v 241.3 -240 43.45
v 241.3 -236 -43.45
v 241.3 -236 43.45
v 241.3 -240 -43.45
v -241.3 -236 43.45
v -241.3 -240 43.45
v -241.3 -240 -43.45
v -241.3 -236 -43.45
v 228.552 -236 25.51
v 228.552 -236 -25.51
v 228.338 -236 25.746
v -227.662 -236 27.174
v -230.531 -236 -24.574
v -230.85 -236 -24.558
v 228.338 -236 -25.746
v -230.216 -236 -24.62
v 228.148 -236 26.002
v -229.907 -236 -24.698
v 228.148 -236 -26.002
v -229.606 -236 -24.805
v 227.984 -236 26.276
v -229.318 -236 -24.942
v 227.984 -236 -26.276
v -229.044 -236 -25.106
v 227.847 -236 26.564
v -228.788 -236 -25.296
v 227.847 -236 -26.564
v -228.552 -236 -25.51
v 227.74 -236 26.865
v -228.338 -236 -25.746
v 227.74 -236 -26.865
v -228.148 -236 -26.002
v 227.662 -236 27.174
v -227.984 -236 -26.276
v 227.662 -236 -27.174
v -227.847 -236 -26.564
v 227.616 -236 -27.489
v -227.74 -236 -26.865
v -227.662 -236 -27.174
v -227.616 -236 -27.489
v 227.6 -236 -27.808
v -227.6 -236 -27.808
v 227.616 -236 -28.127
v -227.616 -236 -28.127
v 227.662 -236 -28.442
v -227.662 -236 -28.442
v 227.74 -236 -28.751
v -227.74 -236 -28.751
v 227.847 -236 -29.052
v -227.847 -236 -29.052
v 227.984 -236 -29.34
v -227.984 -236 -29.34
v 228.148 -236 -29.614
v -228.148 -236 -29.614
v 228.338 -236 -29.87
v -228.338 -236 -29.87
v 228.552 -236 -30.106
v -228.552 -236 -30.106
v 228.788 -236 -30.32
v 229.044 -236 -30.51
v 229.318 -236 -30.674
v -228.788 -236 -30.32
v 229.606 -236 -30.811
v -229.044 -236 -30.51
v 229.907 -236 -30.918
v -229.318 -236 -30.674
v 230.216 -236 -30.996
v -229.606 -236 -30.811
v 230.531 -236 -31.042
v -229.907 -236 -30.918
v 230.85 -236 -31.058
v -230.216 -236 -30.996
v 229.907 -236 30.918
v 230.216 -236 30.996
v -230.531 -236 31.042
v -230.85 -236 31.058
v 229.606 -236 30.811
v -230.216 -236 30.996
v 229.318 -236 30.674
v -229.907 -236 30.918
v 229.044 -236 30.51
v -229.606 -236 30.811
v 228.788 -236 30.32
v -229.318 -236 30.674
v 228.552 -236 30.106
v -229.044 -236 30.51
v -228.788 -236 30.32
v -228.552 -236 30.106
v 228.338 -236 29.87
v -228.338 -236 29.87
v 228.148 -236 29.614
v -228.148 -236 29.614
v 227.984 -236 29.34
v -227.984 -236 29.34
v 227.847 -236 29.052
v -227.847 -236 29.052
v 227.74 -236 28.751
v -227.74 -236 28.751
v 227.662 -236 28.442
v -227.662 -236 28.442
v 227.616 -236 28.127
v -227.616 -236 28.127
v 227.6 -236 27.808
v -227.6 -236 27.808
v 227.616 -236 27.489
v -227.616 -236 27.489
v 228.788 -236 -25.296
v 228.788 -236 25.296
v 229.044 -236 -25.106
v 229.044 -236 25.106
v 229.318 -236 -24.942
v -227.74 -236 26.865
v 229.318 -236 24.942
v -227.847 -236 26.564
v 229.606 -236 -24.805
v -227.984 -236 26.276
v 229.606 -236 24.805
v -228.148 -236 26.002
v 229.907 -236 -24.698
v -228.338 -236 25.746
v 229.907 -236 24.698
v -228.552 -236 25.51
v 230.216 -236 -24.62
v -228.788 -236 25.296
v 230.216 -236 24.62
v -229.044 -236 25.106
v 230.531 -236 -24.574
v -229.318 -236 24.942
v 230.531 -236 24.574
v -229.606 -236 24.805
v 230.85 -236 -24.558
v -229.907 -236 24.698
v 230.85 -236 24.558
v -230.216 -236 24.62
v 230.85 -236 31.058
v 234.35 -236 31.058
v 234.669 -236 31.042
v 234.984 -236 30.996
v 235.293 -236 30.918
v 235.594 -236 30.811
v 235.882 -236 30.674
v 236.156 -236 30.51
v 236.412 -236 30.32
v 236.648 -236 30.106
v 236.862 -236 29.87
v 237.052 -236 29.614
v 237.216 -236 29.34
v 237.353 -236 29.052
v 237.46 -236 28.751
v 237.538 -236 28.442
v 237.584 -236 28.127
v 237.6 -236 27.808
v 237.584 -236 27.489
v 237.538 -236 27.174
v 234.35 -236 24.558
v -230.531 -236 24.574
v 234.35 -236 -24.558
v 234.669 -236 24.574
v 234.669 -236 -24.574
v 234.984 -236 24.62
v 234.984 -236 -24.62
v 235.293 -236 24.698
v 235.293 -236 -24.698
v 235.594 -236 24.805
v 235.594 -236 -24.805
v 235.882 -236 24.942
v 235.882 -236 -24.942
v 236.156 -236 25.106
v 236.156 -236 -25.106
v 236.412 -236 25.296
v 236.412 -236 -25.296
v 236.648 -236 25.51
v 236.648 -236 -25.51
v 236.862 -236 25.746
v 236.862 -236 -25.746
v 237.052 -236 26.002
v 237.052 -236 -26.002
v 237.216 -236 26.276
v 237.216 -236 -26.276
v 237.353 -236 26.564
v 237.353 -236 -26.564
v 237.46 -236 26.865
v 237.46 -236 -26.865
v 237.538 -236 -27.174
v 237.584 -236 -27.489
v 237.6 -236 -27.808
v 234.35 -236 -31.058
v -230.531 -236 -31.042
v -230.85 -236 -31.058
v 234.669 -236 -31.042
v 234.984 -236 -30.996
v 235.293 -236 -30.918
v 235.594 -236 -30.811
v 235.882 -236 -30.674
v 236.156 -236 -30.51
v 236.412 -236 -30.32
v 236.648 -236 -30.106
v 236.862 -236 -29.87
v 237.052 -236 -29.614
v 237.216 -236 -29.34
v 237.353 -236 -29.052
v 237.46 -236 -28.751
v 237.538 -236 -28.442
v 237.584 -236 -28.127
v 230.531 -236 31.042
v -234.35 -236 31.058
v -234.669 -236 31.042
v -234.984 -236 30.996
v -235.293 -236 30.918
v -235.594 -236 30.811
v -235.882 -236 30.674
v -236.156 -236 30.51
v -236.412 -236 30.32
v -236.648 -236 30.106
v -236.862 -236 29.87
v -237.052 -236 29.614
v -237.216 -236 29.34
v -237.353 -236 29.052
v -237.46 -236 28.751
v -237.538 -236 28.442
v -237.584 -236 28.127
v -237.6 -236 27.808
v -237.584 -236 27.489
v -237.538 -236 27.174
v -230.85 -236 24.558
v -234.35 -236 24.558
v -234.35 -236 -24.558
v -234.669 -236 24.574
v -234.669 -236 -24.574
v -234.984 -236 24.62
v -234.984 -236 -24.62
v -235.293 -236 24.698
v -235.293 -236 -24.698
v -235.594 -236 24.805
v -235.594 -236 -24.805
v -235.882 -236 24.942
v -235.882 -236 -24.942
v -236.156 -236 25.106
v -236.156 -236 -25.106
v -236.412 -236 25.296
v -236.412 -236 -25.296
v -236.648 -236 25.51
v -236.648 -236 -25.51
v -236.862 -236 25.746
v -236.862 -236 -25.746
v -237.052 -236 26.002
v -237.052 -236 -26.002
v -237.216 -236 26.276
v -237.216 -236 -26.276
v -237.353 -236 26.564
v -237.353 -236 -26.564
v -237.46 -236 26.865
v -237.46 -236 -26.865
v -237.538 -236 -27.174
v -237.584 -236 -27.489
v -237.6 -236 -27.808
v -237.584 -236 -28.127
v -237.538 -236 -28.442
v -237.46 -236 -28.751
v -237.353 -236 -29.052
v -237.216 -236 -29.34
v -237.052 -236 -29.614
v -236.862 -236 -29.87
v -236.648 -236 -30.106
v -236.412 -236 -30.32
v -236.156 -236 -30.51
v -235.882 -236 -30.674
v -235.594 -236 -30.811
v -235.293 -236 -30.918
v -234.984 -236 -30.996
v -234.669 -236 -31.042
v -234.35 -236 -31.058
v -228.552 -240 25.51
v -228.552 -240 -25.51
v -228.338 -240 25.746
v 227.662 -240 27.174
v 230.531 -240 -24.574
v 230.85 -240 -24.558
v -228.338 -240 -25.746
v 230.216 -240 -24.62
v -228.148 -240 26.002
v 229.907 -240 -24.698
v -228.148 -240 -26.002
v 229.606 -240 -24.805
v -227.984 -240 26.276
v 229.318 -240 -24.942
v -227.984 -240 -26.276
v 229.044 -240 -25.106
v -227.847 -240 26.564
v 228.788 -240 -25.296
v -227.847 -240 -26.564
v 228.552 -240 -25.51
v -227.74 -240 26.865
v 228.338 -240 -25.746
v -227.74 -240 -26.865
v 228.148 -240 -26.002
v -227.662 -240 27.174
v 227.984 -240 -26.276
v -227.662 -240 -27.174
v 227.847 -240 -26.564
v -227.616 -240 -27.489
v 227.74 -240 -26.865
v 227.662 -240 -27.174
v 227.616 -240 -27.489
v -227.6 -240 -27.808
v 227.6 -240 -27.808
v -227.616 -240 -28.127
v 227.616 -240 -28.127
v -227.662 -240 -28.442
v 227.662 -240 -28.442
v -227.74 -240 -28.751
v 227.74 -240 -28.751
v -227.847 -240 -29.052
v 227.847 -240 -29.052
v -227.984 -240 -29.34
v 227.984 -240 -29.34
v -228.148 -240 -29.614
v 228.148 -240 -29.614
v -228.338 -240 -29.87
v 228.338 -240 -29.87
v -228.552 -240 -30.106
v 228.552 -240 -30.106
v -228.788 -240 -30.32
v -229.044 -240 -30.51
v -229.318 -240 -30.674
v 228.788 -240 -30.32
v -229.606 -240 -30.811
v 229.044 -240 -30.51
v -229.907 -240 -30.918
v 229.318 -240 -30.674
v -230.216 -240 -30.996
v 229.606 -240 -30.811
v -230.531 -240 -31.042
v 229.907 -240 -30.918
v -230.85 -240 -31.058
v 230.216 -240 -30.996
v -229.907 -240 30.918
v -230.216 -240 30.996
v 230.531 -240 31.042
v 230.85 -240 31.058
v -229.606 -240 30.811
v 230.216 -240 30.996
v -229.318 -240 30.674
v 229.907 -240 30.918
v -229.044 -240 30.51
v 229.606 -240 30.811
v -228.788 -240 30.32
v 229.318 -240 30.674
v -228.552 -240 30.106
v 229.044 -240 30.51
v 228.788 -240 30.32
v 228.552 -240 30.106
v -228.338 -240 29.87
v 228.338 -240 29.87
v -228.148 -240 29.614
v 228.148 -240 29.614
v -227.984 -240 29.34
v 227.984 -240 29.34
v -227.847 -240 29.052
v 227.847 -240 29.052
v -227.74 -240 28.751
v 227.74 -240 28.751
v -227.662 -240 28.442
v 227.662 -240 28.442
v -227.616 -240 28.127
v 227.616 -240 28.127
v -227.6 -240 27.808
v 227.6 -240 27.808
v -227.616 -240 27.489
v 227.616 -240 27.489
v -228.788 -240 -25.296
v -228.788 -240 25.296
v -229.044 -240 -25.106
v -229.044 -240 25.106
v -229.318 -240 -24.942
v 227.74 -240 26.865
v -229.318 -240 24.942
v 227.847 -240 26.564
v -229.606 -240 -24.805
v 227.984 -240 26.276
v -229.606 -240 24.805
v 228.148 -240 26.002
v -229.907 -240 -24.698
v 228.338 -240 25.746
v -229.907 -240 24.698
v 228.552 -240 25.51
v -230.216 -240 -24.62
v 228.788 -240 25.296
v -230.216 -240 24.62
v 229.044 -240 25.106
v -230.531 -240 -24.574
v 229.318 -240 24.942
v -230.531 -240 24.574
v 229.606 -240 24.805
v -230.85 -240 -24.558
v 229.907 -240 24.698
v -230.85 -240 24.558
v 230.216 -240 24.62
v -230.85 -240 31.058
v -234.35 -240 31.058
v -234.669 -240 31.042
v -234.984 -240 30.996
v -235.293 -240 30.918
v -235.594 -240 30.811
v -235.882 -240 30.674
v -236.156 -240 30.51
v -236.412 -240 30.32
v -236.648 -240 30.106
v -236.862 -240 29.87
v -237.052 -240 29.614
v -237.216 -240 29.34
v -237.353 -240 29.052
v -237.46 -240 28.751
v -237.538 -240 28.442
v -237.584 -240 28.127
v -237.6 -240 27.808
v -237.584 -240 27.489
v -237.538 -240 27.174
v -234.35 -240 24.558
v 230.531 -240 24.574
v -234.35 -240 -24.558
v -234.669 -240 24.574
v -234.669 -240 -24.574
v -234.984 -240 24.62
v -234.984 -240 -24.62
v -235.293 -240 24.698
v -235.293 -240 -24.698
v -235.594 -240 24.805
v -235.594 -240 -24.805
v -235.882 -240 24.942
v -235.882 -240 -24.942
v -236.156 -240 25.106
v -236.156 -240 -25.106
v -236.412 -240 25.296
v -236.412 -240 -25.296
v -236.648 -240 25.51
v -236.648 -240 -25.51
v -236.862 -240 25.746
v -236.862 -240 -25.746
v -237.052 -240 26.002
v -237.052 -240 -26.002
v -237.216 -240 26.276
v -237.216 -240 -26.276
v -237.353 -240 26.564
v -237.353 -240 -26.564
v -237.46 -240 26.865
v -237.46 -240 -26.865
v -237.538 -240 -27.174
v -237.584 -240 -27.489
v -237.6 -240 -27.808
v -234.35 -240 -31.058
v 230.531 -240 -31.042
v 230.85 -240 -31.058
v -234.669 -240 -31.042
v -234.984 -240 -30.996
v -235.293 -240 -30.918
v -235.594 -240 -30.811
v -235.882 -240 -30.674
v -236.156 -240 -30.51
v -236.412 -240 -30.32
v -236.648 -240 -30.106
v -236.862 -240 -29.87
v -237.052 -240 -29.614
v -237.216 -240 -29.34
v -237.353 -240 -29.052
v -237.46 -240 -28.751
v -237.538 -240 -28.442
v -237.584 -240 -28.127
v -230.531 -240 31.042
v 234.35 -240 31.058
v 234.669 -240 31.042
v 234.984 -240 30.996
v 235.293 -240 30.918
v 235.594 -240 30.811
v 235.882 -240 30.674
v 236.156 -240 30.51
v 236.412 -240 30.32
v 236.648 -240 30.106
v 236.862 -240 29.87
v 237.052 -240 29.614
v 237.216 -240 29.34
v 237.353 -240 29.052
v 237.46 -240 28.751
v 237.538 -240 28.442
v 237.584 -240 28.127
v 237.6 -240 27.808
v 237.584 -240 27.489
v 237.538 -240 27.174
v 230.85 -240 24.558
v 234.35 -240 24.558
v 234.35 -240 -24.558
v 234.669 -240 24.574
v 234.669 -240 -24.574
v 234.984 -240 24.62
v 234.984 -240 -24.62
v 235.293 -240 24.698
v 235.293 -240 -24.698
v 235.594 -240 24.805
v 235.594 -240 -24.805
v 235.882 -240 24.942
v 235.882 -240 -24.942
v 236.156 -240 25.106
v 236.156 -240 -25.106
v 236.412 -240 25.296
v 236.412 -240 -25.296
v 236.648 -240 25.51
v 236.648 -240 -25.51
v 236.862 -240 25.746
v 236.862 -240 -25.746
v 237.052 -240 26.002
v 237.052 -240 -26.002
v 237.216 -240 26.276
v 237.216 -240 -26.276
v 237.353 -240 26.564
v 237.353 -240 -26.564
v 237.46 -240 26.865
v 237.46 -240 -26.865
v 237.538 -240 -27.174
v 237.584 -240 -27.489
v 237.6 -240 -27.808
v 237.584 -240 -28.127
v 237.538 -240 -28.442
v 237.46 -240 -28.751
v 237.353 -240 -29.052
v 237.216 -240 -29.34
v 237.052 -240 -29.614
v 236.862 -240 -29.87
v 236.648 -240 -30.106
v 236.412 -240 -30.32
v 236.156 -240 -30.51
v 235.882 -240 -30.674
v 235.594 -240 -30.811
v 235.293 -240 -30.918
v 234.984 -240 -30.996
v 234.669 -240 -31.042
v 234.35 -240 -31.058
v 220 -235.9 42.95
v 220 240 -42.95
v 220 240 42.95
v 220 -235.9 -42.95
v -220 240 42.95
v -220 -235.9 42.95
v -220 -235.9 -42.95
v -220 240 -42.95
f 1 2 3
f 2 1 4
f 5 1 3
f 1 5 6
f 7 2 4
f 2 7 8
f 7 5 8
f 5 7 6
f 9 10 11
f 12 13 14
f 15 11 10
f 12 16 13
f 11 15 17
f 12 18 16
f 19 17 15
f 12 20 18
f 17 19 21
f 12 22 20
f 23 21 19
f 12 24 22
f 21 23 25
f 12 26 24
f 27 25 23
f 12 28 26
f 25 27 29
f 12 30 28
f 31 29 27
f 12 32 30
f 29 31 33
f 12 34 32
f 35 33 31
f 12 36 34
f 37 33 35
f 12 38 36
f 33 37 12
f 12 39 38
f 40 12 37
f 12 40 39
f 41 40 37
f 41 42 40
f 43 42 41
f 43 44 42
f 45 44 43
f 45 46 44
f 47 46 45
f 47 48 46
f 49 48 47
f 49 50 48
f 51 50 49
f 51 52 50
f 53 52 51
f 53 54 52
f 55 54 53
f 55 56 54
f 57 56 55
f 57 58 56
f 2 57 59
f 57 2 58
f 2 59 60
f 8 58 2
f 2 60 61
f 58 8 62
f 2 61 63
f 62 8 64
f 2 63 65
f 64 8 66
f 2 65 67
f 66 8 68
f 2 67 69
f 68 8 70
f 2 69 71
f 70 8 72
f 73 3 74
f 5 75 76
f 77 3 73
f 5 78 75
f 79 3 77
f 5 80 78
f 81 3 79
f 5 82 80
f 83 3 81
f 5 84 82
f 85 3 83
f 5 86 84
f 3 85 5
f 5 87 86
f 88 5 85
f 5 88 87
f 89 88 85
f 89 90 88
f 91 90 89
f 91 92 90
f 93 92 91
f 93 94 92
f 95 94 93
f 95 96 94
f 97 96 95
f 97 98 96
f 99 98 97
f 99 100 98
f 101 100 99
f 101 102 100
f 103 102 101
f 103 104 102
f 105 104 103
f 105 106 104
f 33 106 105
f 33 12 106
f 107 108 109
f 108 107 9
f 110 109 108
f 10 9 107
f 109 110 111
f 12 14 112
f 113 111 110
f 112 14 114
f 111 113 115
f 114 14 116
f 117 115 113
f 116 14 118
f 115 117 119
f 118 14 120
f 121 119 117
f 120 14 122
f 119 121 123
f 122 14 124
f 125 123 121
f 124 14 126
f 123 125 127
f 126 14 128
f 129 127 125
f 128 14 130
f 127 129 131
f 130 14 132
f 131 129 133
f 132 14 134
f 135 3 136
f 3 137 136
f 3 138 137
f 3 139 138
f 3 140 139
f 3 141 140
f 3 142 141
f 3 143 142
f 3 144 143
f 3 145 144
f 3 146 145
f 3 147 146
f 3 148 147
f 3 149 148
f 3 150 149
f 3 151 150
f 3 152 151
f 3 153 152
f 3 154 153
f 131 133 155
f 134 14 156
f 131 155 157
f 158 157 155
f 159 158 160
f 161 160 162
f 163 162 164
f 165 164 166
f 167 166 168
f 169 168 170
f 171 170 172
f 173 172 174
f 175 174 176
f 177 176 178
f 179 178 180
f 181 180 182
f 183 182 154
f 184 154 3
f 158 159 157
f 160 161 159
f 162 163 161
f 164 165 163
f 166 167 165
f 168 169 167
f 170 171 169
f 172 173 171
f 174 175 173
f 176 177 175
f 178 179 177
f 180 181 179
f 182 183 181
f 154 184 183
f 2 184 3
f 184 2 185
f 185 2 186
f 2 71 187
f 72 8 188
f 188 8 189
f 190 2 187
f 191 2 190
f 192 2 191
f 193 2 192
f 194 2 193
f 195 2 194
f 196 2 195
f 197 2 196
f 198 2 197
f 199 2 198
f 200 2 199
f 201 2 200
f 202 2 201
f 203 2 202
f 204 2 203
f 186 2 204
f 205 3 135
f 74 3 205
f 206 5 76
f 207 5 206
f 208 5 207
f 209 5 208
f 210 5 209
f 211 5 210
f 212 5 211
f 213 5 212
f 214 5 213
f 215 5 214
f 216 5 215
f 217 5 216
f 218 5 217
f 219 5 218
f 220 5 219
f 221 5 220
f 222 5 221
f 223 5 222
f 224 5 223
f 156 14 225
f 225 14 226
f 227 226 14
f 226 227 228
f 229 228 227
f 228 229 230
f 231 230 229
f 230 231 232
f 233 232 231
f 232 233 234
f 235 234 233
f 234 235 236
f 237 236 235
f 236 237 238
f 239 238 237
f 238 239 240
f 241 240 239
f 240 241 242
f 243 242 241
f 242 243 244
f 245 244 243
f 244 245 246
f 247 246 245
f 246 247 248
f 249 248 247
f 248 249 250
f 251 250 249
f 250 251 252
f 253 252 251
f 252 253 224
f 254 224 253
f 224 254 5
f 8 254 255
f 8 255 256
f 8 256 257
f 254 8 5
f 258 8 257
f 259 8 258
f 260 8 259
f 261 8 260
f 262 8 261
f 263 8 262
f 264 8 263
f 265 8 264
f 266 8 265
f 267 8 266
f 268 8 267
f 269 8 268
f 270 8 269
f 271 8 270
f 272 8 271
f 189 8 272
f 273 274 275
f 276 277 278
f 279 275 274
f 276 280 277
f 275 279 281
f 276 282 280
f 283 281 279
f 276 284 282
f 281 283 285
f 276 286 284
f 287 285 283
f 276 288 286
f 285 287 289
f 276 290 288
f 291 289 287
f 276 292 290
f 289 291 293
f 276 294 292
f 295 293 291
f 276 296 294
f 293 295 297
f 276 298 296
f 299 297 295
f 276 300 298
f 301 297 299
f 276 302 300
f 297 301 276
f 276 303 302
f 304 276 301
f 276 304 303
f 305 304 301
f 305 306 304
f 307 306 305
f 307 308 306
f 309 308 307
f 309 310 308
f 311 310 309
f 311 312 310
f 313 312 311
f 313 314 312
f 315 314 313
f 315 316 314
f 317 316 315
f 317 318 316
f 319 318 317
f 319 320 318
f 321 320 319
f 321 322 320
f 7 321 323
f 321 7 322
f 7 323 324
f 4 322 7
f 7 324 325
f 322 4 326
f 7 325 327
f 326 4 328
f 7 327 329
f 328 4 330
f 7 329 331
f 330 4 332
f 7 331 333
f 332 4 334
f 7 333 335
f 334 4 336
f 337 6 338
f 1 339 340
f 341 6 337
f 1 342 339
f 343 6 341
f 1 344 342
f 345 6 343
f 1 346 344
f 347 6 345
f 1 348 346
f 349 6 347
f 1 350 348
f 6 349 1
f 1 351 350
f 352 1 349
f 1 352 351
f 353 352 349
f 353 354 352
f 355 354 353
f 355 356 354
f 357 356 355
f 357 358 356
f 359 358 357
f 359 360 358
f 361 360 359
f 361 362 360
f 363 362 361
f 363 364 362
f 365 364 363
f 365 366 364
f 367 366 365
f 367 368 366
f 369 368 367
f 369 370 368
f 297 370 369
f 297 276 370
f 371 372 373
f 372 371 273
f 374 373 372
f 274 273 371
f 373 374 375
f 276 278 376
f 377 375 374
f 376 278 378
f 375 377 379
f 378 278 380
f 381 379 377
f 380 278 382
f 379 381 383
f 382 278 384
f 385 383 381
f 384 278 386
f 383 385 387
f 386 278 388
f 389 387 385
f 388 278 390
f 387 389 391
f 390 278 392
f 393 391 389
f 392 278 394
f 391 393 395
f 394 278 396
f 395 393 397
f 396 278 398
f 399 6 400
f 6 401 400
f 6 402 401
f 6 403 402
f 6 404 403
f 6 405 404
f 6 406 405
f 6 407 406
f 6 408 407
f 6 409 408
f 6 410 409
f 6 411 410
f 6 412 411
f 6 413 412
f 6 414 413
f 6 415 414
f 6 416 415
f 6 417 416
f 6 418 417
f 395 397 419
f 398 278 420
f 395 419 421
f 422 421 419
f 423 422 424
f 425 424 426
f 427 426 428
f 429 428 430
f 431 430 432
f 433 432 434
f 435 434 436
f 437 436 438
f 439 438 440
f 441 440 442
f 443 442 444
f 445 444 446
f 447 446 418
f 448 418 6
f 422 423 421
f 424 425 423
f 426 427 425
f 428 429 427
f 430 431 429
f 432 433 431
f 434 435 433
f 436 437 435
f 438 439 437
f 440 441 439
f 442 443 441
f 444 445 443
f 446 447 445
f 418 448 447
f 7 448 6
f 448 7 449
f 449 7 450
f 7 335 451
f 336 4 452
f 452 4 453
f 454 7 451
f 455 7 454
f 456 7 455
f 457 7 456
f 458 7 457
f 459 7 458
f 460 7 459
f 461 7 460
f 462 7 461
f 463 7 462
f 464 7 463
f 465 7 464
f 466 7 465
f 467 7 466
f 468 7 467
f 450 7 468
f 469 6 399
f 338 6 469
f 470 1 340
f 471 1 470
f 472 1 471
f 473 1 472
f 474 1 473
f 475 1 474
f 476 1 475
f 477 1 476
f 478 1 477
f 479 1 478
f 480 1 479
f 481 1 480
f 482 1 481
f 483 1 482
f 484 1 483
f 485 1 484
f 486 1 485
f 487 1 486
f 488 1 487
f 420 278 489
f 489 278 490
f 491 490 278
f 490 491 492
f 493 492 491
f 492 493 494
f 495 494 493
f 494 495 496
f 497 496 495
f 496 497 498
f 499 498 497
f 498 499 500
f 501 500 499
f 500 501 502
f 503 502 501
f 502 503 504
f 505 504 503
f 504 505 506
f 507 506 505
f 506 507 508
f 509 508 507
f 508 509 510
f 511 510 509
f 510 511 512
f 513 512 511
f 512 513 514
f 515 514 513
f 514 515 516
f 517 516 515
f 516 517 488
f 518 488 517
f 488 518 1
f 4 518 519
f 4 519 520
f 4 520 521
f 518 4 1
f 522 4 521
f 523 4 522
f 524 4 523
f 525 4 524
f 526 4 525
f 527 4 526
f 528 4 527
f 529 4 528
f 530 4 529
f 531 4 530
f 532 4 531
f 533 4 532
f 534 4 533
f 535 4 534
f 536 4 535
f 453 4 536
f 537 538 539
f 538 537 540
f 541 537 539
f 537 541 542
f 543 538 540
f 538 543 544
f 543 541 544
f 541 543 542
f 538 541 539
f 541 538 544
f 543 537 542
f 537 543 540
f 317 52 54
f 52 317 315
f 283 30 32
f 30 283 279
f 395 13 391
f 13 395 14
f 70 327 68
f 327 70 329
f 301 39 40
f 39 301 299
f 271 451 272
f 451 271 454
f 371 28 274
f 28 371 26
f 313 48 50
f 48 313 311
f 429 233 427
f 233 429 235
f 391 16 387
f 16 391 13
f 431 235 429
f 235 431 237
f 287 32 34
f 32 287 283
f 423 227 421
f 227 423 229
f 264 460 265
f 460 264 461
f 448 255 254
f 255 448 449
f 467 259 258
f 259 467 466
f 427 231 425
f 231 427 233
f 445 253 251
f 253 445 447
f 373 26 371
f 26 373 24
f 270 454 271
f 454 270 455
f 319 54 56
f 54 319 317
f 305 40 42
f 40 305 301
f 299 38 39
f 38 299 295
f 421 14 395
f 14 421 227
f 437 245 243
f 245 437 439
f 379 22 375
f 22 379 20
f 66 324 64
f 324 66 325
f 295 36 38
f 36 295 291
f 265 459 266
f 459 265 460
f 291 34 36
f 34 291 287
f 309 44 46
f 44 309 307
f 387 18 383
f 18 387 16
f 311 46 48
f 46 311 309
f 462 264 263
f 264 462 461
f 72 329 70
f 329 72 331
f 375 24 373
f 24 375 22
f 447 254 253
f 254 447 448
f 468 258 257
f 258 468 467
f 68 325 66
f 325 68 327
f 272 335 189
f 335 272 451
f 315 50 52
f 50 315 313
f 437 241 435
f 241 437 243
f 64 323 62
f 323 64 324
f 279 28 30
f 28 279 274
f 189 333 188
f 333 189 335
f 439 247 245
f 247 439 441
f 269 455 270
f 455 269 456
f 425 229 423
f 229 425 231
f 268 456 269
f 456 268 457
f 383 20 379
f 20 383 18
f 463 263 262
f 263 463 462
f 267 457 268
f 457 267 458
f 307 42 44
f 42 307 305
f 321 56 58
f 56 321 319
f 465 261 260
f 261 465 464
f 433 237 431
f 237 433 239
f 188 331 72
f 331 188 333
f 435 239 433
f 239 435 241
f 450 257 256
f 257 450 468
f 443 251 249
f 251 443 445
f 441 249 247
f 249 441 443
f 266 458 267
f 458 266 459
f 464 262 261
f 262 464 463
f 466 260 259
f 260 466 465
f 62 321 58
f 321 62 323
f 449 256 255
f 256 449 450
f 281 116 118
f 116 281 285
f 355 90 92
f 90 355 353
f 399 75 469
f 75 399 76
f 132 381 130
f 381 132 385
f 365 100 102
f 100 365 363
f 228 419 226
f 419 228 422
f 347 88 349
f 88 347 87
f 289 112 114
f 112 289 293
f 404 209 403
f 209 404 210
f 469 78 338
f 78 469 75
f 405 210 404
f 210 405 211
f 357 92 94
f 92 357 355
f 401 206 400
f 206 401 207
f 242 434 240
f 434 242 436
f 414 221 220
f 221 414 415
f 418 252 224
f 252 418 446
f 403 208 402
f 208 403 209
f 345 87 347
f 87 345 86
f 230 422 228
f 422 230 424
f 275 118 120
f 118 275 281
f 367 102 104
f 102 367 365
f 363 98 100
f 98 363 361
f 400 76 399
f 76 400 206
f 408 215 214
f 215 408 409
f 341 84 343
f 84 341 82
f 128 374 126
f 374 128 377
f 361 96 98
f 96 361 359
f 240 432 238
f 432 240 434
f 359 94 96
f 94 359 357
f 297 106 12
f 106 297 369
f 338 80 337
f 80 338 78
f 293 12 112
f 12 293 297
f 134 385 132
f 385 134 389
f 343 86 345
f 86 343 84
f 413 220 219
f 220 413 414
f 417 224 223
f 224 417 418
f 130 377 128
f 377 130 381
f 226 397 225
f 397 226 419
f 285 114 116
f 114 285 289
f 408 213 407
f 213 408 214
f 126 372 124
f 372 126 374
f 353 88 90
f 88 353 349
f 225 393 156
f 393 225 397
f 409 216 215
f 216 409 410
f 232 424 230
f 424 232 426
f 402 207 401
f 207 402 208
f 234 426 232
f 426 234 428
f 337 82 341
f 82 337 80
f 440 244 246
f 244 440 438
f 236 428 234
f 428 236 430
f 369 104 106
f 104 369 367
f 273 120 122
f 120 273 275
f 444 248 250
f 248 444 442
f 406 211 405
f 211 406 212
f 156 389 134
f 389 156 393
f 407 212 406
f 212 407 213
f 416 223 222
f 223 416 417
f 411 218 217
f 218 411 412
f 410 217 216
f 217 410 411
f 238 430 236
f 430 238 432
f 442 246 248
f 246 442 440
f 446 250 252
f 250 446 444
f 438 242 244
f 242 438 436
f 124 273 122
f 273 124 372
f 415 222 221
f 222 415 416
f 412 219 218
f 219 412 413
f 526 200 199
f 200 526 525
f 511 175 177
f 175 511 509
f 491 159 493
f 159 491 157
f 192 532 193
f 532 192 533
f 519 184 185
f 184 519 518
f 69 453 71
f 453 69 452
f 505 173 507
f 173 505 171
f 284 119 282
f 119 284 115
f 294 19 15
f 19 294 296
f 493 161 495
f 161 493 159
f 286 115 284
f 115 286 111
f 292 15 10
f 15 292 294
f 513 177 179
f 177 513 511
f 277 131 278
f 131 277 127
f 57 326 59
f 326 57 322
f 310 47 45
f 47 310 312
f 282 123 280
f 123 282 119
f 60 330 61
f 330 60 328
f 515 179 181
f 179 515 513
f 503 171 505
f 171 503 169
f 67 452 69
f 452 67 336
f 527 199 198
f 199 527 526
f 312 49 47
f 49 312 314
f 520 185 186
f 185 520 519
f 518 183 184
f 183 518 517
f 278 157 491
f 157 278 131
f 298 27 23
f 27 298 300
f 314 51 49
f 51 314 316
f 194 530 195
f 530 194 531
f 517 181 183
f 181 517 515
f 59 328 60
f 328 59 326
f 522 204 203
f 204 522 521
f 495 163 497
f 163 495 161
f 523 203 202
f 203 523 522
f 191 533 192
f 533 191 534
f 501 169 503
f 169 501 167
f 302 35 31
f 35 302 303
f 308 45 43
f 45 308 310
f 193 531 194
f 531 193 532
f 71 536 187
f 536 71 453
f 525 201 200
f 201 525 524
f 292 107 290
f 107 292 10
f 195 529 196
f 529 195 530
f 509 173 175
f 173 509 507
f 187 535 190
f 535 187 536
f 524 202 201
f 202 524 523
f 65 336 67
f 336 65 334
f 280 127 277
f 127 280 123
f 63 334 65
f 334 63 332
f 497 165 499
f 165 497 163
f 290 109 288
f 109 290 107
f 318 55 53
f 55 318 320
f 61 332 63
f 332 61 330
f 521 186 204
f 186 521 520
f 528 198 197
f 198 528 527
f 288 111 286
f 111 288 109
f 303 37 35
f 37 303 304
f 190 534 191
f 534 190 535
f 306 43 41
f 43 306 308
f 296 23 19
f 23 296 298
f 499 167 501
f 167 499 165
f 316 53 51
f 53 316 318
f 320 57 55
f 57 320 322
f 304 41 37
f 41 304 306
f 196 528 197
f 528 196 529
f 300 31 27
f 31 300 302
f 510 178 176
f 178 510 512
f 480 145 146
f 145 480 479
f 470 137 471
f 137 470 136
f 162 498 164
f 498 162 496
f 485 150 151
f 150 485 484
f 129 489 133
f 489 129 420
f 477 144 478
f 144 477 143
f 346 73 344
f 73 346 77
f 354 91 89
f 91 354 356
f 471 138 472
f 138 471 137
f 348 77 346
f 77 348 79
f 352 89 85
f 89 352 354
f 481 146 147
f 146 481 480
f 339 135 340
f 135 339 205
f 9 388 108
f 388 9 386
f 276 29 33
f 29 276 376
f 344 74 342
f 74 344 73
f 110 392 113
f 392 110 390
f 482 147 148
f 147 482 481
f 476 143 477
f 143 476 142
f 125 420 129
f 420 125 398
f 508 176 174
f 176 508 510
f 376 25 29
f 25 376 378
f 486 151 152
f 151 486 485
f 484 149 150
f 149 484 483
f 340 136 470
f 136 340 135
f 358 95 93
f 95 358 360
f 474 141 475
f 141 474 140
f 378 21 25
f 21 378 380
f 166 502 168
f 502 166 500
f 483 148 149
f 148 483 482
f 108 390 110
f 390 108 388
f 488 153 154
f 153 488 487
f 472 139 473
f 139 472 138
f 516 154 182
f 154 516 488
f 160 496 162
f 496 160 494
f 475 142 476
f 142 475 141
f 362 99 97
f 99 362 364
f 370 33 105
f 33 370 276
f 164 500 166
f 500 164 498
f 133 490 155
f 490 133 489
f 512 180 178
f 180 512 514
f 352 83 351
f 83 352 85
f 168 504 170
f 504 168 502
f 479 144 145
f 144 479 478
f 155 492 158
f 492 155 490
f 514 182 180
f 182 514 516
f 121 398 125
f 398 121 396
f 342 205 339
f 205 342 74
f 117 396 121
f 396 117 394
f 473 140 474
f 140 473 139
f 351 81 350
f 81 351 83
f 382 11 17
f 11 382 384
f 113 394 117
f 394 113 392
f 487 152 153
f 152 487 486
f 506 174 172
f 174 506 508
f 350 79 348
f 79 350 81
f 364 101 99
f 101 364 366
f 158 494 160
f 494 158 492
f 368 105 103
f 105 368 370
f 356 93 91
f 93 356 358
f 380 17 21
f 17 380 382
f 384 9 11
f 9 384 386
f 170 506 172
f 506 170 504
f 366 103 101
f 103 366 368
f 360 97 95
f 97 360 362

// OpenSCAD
// ============================================================================
// Atom Lithography Machine — Parametric OpenSCAD Module (S6.5-02)
// ============================================================================
// part_id           : S6.5-02
// parent_bom_id     : S6.5
// subsystem         : S6
// part_name         : Genis-bantli RF guc yukselticileri ve yonlu kuplorler
// material          : Al 6061
// temp_stage        : 300 K (kabin)
// vacuum_grade      : Atmosfer
// tolerance         : ±0.5 dB
// computed_mass_kg  : 9.57064
// envelope_mm       : 482.600 x 492.050 x 86.900
// design_maturity   : M0_M1_DETAILED_CAD_DESIGN_ONLY
// no_lab_measurement: true
// iec61508_certified: false
// semi_s2_certified : false
// Units: millimeters (mm)
// ============================================================================

$fn = 64;

// Nominal bounding envelope parameters (mm)
bbox_x = 482.6000;
bbox_y = 492.0500;
bbox_z = 86.9000;

// Part-specific parametric dimensions
rack_u = 2;
p_out_w = 10.0;
f_max_mhz = 200.0;

// Interface / port parameters (mm)

module part_S6_5_02() {
  difference() {
    union() {
      // 19" EIA-310 front bezel panel
      translate([0.000, -238.000, 0.000]) cube([482.600, 4.000, 86.900], center=true);
      // Hollow EMI shielded chassis body
      translate([0.000, 2.050, 0.000]) cube([440.000, 475.900, 85.900], center=true);
    }
    // EIA-310 rack ear slot
    translate([-232.600, -238.000, -27.808]) rotate([90.000, 0.000, 0.000]) {
      hull() {
        translate([-1.750, 0, 0]) cylinder(d=6.500, h=6.000, center=true);
        translate([1.750, 0, 0]) cylinder(d=6.500, h=6.000, center=true);
      }
    }
    // EIA-310 rack ear slot
    translate([-232.600, -238.000, 27.808]) rotate([90.000, 0.000, 0.000]) {
      hull() {
        translate([-1.750, 0, 0]) cylinder(d=6.500, h=6.000, center=true);
        translate([1.750, 0, 0]) cylinder(d=6.500, h=6.000, center=true);
      }
    }
    // EIA-310 rack ear slot
    translate([232.600, -238.000, -27.808]) rotate([90.000, 0.000, 0.000]) {
      hull() {
        translate([-1.750, 0, 0]) cylinder(d=6.500, h=6.000, center=true);
        translate([1.750, 0, 0]) cylinder(d=6.500, h=6.000, center=true);
      }
    }
    // EIA-310 rack ear slot
    translate([232.600, -238.000, 27.808]) rotate([90.000, 0.000, 0.000]) {
      hull() {
        translate([-1.750, 0, 0]) cylinder(d=6.500, h=6.000, center=true);
        translate([1.750, 0, 0]) cylinder(d=6.500, h=6.000, center=true);
      }
    }
  }
}

// World assembly mounting transform (global machine frame, mm / deg):
// translate([2100.000, 0.000, 578.950]) rotate([0.000, 0.000, 0.000]) part_S6_5_02();

part_S6_5_02();
